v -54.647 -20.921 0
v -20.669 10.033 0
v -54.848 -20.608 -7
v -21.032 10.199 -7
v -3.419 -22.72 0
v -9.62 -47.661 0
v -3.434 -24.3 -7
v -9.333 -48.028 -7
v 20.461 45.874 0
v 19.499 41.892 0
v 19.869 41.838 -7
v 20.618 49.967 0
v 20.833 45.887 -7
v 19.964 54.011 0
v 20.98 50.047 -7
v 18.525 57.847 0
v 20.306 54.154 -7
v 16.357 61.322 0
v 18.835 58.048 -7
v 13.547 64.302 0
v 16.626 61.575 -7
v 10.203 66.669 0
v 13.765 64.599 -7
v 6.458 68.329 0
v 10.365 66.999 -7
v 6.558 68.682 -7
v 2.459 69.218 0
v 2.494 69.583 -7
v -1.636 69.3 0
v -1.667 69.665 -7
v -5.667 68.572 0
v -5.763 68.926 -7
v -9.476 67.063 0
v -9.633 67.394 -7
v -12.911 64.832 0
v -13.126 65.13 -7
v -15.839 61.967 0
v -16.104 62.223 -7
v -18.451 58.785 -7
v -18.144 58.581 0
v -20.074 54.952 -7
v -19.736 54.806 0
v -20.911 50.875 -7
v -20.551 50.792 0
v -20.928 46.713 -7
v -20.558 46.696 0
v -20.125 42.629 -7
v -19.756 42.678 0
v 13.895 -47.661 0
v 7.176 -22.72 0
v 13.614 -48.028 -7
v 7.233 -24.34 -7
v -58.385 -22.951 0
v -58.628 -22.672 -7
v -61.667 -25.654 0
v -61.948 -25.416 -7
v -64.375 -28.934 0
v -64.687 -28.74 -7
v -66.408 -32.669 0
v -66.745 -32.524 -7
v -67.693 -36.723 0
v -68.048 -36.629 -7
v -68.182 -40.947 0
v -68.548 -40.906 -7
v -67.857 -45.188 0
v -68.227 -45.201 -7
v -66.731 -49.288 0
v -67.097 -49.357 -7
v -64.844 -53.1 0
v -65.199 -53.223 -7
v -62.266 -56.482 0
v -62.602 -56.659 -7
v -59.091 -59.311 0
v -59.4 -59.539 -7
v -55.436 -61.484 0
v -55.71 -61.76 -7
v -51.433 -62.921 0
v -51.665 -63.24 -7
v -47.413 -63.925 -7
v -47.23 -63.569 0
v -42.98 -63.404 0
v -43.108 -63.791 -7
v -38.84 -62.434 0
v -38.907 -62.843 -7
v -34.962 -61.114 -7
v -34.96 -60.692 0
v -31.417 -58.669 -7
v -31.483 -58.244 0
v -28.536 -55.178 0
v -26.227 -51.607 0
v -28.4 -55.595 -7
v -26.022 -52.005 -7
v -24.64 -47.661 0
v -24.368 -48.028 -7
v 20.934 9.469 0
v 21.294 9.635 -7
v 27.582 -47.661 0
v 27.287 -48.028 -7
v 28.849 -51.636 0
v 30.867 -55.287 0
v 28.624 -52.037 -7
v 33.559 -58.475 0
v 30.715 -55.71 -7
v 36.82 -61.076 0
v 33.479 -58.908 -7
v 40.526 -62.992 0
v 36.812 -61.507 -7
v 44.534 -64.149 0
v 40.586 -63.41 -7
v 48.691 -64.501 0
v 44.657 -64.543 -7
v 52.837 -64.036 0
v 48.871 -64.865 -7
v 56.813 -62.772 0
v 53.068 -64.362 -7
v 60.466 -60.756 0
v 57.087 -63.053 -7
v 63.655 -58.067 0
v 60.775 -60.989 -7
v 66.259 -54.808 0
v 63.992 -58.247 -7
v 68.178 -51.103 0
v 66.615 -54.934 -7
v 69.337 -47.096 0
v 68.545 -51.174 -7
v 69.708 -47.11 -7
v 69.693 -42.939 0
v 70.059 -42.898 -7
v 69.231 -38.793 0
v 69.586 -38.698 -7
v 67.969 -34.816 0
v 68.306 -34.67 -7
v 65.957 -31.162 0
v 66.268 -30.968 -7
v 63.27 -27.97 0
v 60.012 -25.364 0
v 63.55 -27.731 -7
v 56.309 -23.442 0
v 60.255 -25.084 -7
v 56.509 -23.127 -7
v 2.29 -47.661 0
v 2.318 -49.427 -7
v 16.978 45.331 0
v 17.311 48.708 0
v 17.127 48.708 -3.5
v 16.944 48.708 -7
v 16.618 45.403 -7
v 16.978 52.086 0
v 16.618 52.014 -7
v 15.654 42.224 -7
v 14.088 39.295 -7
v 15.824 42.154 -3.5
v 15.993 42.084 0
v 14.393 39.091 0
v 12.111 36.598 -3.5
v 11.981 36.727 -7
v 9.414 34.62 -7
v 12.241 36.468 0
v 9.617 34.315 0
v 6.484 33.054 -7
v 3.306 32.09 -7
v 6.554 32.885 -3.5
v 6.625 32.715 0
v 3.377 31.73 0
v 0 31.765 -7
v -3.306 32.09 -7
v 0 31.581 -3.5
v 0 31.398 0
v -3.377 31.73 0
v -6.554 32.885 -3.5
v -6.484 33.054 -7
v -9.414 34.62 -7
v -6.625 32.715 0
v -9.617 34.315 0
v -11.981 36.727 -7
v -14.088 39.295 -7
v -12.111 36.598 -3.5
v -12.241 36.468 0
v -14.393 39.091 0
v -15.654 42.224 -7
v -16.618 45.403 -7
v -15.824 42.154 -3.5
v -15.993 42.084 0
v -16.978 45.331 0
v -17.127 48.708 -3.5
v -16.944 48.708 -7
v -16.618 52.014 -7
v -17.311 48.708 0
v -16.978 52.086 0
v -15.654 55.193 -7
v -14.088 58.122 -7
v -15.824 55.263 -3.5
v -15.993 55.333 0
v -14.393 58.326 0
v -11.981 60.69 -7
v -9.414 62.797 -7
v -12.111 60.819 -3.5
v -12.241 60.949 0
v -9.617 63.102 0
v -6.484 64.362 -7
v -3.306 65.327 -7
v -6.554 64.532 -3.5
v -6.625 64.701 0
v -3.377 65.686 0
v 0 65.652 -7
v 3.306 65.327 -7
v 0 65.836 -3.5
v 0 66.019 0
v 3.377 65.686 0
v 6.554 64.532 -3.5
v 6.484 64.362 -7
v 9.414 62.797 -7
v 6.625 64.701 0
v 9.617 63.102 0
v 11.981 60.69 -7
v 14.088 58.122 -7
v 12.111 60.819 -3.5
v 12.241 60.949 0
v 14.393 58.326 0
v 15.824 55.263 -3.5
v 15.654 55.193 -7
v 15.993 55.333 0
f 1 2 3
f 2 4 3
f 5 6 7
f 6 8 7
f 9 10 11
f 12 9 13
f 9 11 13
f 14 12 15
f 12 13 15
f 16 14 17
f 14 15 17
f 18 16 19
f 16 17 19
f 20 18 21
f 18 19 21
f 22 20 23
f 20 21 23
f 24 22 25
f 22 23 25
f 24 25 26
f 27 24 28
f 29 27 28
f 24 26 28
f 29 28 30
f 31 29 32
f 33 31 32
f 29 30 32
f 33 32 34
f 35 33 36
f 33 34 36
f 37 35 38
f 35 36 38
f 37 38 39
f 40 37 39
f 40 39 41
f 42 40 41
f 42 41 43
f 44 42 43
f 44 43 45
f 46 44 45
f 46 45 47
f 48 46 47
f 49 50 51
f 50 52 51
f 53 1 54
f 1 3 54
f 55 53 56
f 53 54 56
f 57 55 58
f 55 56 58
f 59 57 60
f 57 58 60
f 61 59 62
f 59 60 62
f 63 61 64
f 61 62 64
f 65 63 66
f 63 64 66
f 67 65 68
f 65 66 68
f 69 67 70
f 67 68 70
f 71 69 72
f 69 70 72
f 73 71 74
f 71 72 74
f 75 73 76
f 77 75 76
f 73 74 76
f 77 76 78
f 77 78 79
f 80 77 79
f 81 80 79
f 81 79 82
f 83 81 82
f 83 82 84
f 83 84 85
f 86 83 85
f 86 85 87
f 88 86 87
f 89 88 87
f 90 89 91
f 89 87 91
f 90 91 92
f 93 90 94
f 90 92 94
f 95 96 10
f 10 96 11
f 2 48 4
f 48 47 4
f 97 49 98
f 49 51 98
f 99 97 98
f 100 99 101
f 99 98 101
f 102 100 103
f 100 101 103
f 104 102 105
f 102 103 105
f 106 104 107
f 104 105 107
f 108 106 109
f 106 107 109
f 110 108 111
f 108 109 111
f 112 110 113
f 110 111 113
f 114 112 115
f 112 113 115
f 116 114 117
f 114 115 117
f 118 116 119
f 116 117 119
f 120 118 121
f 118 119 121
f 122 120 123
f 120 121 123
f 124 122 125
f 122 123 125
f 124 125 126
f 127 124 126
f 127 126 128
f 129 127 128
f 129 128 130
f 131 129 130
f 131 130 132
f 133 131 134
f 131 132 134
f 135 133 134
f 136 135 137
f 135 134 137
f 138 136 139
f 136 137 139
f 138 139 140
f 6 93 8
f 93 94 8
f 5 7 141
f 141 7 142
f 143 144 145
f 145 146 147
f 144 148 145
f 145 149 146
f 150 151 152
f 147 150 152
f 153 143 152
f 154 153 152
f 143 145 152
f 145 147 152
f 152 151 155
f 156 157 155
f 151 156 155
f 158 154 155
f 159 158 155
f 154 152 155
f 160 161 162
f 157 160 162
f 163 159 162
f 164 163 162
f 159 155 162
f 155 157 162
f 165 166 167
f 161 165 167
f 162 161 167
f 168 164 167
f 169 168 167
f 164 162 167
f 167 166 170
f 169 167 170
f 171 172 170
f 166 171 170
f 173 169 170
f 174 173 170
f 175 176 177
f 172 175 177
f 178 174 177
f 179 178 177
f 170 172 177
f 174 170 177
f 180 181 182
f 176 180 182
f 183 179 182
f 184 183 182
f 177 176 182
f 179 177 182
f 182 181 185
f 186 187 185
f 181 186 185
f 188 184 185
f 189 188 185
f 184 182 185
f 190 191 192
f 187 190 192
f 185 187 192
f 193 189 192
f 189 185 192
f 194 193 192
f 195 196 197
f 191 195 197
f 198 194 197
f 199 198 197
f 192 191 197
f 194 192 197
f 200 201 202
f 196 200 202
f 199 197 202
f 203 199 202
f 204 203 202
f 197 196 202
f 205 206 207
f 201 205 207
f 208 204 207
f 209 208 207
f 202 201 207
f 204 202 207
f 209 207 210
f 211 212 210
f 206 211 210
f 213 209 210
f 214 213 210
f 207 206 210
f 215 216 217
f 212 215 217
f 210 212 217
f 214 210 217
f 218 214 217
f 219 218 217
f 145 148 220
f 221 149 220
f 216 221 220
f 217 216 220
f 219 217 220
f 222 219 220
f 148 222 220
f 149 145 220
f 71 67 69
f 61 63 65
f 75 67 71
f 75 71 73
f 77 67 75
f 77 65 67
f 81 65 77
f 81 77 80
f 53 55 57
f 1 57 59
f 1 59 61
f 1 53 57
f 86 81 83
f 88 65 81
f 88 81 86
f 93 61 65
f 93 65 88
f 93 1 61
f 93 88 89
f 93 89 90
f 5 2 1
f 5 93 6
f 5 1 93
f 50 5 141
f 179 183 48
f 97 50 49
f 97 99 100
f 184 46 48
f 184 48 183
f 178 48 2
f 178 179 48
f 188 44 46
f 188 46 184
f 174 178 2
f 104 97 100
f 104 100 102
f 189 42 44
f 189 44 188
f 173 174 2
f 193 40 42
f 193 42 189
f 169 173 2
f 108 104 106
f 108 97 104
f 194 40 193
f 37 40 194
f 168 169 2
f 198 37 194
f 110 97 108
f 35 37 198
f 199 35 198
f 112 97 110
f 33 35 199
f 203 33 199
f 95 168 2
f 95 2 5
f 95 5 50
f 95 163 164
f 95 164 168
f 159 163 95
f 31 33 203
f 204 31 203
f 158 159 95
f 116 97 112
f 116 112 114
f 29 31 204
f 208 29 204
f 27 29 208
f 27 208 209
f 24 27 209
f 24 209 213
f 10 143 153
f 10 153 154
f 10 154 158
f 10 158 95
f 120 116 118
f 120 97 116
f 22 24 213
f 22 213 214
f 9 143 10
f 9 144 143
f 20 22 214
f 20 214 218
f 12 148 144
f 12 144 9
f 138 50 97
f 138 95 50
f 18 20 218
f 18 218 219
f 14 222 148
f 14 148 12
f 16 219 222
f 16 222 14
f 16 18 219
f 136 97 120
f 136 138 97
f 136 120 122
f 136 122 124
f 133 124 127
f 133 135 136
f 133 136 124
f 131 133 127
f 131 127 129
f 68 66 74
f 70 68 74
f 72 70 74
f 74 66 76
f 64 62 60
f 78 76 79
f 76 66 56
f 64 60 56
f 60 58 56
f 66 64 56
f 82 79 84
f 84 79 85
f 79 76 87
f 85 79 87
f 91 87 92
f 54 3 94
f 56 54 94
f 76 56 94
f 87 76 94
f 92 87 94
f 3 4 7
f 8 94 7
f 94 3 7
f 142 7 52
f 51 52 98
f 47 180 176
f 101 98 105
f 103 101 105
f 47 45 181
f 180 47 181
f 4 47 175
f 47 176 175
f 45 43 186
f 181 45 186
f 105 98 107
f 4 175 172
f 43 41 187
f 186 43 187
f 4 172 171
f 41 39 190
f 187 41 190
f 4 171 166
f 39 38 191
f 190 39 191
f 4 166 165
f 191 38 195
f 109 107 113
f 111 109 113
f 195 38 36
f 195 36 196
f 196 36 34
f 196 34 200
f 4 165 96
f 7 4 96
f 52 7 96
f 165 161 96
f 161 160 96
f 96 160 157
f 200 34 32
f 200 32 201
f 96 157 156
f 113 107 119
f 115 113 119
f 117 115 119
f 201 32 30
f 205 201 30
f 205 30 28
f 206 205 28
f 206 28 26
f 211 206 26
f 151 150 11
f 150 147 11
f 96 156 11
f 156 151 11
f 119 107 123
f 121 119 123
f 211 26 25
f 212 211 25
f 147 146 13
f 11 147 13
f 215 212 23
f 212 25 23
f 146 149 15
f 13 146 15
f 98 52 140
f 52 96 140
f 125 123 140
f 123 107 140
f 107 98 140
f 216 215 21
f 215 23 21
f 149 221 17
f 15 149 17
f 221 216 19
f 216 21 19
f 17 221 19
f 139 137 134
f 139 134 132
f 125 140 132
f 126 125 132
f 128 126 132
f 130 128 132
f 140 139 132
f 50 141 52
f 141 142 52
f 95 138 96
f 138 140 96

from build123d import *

# Parameters (mm, degrees)
F0_R     = 17.7226640642
F0_R_2   = 18.3749948005
F0_R_3   = 17.2587936306
F0_R_4   = 17.3107234895
F1_DEPTH = 7
F1_TAPER = -3


with BuildPart() as f1:
    # F0 (on Top) → F1 (new body)
    with BuildSketch(Plane.XY):
        with BuildLine():
            Line((20.9337220527, 9.4692130681), (19.499204162, 41.8922447345))
            ThreePointArc((19.499204162, 41.8922447345), (0.4136393699, 69.3604386191), (-19.7564966048, 42.6784957835))
            Line((-19.7564966048, 42.6784957835), (-20.6694687182, 10.0329346663))
            Line((-20.6694687182, 10.0329346663), (-54.6471718869, -20.9214688483))
            ThreePointArc((-54.6471718869, -20.9214688483), (-60.7466147764, -57.9726414688), (-24.6403292313, -47.6610586484))
            Line((-24.6403292313, -47.6610586484), (-9.6195229838, -47.6610586484))
            Line((-9.6195229838, -47.6610586484), (-3.4192691352, -22.7199320794))
            Line((-3.4192691352, -22.7199320794), (2.290364122, -47.6610586484))
            Line((2.290364122, -47.6610586484), (7.1764700115, -22.7199320794))
            Line((7.1764700115, -22.7199320794), (13.8948652893, -47.6610586484))
            Line((13.8948652893, -47.6610586484), (27.5816481614, -47.6610586484))
            ThreePointArc((27.5816481614, -47.6610586484), (62.1265489826, -59.4900511481), (56.3092509412, -23.4423843748))
            Line((56.3092509412, -23.4423843748), (20.9337220527, 9.4692130681))
        make_face()
        with Locations((-45.9599420428, -41.3792170584)):
            Circle(F0_R, mode=Mode.SUBTRACT)
        Circle(F0_R_2, mode=Mode.SUBTRACT)
        with Locations((48.4029948711, -43.211504817)):
            Circle(F0_R_3, mode=Mode.SUBTRACT)
        with Locations((0, 48.7083792686)):
            Circle(F0_R_4, mode=Mode.SUBTRACT)
        Circle(F0_R_2)
        with Locations((48.4029948711, -43.211504817)):
            Circle(F0_R_3)
        with Locations((-45.9599420428, -41.3792170584)):
            Circle(F0_R)
    extrude(amount=-F1_DEPTH, taper=F1_TAPER)


solid = f1.part
